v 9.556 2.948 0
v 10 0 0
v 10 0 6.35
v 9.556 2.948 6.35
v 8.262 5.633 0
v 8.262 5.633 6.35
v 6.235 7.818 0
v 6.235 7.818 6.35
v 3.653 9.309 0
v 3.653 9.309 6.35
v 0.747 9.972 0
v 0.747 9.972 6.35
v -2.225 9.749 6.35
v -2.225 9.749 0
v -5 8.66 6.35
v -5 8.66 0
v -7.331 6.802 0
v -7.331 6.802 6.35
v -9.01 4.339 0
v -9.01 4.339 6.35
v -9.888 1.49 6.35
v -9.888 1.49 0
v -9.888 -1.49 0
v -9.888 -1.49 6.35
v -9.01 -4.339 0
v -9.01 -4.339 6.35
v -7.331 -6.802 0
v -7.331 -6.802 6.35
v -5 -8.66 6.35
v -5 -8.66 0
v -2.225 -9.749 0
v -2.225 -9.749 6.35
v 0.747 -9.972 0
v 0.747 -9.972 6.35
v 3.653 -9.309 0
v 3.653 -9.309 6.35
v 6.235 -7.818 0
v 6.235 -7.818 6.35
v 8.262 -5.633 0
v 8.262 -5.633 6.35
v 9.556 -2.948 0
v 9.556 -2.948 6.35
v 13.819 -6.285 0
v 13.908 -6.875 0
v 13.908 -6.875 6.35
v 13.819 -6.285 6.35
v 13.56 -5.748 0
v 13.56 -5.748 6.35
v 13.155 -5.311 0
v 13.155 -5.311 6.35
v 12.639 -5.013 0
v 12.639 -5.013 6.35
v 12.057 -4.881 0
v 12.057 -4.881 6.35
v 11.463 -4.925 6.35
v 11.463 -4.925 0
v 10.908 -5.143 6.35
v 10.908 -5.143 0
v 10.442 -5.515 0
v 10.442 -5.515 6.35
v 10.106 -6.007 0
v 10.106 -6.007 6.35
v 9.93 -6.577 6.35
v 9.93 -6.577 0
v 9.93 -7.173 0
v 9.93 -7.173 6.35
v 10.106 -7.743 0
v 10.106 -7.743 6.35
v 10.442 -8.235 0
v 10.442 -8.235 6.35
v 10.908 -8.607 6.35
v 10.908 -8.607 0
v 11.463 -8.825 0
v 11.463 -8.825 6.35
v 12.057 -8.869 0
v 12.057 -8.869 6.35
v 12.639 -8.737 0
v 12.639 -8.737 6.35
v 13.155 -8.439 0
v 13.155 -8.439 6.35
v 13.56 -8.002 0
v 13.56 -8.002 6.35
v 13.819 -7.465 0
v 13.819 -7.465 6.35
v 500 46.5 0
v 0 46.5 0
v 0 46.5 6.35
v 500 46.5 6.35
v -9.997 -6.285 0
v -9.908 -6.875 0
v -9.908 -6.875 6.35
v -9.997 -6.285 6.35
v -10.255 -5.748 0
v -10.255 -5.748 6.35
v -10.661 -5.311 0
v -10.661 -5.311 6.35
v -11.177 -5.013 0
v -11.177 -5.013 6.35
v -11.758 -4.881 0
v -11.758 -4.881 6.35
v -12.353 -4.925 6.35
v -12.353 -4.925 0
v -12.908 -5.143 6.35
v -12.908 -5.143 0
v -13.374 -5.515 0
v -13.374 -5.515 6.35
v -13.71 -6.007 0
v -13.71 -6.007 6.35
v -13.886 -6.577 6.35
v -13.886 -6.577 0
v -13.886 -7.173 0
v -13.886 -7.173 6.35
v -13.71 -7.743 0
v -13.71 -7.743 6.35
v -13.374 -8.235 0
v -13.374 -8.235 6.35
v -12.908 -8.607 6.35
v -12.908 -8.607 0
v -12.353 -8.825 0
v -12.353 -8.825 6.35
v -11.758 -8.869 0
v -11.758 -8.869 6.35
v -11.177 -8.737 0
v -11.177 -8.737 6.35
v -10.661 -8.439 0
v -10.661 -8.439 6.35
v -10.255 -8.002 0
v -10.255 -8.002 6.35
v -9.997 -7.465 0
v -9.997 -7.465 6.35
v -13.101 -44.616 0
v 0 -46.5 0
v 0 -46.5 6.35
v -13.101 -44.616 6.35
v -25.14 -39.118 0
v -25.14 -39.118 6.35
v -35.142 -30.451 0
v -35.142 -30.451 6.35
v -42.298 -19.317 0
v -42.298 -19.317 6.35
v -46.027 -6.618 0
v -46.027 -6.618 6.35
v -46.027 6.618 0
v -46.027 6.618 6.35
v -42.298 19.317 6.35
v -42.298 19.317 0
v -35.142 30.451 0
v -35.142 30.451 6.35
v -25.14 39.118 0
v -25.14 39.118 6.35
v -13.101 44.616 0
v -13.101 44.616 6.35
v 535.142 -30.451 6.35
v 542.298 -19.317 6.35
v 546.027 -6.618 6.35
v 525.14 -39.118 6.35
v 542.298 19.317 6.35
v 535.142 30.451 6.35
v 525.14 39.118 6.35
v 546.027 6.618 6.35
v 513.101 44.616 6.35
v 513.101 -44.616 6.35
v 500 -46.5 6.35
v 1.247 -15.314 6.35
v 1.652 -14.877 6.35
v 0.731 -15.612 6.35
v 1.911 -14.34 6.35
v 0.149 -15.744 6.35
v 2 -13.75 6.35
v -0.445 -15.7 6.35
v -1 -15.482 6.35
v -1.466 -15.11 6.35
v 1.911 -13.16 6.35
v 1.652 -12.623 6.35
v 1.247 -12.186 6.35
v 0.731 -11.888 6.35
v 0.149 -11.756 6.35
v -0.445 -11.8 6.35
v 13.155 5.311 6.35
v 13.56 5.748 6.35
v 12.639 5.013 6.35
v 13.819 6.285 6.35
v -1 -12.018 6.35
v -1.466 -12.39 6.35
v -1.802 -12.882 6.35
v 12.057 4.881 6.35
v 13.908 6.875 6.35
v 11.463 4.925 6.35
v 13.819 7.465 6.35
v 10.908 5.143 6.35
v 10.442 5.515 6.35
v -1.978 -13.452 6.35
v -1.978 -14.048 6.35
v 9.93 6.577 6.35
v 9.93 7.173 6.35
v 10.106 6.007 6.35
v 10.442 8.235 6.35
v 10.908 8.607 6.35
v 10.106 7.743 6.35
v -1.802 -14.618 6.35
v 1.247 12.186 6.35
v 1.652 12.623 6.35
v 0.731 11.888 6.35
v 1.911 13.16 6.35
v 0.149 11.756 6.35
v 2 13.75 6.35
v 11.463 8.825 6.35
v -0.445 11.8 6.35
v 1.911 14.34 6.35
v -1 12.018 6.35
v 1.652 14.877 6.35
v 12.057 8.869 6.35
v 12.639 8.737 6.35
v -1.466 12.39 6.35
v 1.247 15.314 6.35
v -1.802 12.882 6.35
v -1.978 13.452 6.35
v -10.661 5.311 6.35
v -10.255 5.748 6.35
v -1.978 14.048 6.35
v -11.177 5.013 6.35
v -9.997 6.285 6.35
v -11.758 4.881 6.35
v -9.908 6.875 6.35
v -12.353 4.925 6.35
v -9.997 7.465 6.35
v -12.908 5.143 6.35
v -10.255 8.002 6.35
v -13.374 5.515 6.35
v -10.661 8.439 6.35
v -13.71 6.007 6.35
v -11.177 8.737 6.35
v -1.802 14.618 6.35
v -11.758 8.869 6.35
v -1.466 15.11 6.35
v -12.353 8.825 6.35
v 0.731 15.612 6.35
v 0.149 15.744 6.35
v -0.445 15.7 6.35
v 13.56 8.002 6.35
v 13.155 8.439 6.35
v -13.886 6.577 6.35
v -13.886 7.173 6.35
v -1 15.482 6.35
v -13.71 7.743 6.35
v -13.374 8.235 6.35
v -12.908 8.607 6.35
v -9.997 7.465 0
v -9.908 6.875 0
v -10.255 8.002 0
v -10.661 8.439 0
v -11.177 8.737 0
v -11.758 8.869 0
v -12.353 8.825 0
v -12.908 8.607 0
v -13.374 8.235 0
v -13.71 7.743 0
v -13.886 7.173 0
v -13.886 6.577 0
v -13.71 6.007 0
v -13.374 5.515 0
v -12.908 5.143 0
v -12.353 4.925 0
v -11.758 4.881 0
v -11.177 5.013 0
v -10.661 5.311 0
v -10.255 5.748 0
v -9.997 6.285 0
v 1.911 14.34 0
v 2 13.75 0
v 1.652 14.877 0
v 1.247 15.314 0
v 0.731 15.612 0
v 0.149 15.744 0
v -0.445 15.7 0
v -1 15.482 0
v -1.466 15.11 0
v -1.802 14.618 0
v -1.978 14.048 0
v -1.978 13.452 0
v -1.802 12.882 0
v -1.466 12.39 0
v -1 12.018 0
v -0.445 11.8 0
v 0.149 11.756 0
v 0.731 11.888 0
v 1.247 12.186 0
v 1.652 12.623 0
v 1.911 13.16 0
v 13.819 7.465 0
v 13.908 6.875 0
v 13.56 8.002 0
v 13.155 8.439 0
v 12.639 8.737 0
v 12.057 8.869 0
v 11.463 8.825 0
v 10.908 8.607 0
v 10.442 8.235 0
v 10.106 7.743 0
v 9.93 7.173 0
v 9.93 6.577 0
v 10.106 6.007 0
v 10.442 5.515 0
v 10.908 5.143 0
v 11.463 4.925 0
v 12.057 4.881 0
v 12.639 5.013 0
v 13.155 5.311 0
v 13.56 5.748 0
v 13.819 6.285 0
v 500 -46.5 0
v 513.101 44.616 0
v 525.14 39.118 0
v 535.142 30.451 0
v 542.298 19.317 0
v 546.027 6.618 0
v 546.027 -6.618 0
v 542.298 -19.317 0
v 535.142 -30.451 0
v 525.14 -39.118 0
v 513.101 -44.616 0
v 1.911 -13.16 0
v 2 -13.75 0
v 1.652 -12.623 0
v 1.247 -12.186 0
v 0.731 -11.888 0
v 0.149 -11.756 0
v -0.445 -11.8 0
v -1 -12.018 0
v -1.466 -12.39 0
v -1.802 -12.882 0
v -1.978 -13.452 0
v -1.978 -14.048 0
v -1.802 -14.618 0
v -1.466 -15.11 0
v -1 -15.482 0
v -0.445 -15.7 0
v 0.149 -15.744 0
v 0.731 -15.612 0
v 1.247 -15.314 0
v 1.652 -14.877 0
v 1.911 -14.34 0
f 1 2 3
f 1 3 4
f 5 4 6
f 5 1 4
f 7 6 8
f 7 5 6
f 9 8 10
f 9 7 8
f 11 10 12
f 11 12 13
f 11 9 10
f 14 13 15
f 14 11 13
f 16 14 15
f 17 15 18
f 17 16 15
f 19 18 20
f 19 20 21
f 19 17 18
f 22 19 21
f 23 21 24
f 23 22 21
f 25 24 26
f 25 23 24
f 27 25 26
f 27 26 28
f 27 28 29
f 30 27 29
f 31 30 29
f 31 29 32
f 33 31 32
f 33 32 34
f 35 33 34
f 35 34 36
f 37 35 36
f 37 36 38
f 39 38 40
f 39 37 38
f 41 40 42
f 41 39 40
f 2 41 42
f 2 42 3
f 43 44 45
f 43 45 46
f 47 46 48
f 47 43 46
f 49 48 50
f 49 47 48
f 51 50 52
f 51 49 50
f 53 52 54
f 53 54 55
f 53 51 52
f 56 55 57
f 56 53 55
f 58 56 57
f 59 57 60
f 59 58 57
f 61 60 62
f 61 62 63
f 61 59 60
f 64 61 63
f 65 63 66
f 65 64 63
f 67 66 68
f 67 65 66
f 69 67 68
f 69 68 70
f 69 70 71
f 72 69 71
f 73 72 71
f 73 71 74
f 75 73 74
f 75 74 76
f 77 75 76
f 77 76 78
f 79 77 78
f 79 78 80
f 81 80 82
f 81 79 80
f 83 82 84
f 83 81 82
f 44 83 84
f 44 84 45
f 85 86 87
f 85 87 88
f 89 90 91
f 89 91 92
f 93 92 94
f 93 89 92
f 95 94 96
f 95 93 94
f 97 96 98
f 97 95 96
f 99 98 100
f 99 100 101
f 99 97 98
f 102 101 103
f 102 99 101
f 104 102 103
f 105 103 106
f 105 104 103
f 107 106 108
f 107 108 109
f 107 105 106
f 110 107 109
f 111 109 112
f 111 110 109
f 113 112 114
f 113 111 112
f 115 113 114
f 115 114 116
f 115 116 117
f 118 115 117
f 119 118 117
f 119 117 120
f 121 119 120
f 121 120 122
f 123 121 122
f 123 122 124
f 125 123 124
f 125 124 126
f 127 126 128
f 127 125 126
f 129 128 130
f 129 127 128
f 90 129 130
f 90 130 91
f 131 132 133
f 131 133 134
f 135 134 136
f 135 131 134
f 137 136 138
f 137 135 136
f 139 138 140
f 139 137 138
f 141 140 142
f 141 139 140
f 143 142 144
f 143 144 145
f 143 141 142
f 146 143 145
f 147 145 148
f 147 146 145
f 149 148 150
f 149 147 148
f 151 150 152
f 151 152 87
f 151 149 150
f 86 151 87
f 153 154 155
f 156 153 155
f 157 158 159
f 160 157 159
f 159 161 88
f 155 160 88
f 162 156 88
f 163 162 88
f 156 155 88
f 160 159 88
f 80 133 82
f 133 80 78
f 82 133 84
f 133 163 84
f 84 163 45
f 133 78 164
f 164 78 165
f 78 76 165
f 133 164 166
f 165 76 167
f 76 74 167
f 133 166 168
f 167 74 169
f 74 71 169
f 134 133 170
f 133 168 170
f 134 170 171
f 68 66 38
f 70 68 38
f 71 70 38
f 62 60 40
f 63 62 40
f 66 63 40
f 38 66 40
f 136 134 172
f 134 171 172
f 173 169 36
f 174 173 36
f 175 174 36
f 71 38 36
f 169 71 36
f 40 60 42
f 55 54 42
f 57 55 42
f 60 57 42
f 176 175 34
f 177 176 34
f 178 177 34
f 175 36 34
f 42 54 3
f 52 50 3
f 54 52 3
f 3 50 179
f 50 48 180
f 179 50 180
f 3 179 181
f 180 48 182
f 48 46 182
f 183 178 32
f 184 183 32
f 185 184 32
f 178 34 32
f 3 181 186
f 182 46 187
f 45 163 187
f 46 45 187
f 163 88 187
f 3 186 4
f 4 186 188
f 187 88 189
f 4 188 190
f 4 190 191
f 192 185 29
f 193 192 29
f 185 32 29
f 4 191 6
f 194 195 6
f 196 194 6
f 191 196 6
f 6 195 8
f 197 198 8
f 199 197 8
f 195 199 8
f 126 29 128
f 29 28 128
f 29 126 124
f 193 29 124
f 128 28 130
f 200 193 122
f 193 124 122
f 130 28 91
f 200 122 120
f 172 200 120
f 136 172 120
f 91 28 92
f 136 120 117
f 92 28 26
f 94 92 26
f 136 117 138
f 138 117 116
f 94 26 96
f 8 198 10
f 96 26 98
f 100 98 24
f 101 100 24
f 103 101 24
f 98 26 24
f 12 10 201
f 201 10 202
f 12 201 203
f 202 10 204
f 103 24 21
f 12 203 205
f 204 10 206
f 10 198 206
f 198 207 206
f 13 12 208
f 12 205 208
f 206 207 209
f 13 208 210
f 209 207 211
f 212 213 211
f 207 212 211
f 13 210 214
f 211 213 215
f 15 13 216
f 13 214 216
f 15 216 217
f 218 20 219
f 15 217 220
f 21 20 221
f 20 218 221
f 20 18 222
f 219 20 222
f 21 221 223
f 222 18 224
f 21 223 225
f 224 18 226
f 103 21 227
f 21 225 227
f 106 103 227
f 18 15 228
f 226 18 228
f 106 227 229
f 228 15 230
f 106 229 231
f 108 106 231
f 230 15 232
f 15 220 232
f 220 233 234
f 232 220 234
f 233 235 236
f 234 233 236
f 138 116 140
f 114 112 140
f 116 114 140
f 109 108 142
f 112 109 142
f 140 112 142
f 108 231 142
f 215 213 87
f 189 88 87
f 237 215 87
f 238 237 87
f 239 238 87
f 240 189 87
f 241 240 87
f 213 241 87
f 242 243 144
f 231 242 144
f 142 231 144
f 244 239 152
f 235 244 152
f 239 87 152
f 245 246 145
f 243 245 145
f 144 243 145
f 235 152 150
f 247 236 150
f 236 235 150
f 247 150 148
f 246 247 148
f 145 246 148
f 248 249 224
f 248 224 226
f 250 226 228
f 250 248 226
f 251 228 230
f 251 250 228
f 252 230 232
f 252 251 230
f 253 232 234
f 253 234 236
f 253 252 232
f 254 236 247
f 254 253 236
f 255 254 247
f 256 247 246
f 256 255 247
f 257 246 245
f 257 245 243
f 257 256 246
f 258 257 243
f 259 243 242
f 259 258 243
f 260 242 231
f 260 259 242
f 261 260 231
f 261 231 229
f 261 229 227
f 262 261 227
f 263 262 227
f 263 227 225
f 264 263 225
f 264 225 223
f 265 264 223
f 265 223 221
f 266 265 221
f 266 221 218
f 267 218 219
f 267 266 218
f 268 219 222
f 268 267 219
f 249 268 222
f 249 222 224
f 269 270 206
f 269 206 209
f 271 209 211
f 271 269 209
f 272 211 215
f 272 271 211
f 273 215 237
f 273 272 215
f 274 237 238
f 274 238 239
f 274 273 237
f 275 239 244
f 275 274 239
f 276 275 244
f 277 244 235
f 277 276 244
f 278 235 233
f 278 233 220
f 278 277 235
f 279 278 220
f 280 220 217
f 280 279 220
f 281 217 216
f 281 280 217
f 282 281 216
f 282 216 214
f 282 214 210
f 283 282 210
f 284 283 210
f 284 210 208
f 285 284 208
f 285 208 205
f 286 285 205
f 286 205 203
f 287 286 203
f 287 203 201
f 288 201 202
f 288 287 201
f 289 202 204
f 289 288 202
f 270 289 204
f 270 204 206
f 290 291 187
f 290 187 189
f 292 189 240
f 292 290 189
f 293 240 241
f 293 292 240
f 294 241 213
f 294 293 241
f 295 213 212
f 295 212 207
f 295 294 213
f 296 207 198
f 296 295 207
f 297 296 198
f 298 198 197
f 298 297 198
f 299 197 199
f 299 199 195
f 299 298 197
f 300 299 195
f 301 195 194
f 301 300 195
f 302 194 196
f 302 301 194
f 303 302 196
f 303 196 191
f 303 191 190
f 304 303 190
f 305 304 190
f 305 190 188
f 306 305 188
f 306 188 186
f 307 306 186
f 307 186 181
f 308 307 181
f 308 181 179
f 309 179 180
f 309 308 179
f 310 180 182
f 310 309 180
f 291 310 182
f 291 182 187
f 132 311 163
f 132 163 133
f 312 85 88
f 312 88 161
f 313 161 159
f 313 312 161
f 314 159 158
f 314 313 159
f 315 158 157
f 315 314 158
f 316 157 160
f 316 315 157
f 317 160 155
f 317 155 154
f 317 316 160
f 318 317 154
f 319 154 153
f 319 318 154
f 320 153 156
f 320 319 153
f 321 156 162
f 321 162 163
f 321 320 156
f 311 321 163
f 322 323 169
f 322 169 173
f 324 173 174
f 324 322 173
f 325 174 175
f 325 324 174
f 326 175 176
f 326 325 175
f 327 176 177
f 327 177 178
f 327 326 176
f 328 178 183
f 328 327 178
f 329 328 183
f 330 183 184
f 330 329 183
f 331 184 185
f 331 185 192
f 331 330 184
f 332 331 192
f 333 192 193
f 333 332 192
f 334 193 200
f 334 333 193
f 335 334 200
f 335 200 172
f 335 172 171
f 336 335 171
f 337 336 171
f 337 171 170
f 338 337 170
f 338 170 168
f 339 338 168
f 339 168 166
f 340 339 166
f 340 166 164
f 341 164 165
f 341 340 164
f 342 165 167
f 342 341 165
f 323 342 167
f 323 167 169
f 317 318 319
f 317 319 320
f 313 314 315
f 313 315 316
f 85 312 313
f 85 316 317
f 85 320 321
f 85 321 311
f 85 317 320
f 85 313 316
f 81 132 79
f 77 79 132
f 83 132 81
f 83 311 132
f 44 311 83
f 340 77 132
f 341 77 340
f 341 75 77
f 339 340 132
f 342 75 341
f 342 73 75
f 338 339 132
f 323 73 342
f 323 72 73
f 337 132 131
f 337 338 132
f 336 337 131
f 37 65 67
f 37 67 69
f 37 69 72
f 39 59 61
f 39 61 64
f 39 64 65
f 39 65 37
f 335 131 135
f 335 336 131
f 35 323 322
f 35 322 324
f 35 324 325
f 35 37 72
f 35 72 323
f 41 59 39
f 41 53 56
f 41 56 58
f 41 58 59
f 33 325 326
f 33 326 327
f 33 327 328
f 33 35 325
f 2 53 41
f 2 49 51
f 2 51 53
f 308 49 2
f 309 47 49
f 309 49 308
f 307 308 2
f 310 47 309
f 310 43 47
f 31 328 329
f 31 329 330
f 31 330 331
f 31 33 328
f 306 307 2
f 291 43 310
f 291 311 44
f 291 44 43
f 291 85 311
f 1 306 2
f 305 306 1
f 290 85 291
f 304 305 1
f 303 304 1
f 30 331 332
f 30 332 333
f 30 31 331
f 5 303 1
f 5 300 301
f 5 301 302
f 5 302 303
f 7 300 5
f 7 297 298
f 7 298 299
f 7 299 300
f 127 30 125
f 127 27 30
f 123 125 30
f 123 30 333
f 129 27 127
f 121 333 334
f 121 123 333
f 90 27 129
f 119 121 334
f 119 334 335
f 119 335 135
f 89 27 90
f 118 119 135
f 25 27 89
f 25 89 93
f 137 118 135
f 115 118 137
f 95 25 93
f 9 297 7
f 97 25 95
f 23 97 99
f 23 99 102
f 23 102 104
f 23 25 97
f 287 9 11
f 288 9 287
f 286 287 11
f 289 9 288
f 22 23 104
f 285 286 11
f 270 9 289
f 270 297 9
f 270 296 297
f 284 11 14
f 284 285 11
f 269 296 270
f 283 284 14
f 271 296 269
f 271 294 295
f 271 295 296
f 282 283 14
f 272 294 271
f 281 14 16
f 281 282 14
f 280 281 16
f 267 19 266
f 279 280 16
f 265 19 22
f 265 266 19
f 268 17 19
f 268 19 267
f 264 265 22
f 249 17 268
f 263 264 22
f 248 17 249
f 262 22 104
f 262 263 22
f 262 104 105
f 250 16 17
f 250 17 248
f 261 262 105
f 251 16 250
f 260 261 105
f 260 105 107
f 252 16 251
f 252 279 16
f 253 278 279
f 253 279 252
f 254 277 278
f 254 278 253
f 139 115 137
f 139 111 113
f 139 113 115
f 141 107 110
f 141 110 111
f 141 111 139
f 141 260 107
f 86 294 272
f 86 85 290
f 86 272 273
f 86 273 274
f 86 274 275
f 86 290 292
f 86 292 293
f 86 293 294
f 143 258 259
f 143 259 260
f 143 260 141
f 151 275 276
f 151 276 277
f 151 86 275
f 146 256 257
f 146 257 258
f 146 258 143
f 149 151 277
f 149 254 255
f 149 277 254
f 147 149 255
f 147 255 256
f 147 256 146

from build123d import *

# Parameters (mm, degrees)
SKETCH2_R           = 10
SKETCH2_R_2         = 2
BOSS_EXTRUDE1_DEPTH = 6.35


with BuildPart() as part:
    # Sketch2 → Boss-Extrude1 (new body)
    with BuildSketch(Plane.XY):
        with BuildLine():
            Line((0, 46.5), (500, 46.5))
            ThreePointArc((500, 46.5), (546.5, 0), (500, -46.5))
            Line((500, -46.5), (0, -46.5))
            ThreePointArc((0, -46.5), (-46.5, 0), (0, 46.5))
        make_face()
        Circle(SKETCH2_R, mode=Mode.SUBTRACT)
        with Locations((0, 13.75)):
            Circle(SKETCH2_R_2, mode=Mode.SUBTRACT)
        with Locations((11.907849302, 6.875)):
            Circle(SKETCH2_R_2, mode=Mode.SUBTRACT)
        with Locations((11.907849302, -6.875)):
            Circle(SKETCH2_R_2, mode=Mode.SUBTRACT)
        with Locations((0, -13.75)):
            Circle(SKETCH2_R_2, mode=Mode.SUBTRACT)
        with Locations((-11.907849302, -6.875)):
            Circle(SKETCH2_R_2, mode=Mode.SUBTRACT)
        with Locations((-11.907849302, 6.875)):
            Circle(SKETCH2_R_2, mode=Mode.SUBTRACT)
    extrude(amount=BOSS_EXTRUDE1_DEPTH)


solid = part.part
